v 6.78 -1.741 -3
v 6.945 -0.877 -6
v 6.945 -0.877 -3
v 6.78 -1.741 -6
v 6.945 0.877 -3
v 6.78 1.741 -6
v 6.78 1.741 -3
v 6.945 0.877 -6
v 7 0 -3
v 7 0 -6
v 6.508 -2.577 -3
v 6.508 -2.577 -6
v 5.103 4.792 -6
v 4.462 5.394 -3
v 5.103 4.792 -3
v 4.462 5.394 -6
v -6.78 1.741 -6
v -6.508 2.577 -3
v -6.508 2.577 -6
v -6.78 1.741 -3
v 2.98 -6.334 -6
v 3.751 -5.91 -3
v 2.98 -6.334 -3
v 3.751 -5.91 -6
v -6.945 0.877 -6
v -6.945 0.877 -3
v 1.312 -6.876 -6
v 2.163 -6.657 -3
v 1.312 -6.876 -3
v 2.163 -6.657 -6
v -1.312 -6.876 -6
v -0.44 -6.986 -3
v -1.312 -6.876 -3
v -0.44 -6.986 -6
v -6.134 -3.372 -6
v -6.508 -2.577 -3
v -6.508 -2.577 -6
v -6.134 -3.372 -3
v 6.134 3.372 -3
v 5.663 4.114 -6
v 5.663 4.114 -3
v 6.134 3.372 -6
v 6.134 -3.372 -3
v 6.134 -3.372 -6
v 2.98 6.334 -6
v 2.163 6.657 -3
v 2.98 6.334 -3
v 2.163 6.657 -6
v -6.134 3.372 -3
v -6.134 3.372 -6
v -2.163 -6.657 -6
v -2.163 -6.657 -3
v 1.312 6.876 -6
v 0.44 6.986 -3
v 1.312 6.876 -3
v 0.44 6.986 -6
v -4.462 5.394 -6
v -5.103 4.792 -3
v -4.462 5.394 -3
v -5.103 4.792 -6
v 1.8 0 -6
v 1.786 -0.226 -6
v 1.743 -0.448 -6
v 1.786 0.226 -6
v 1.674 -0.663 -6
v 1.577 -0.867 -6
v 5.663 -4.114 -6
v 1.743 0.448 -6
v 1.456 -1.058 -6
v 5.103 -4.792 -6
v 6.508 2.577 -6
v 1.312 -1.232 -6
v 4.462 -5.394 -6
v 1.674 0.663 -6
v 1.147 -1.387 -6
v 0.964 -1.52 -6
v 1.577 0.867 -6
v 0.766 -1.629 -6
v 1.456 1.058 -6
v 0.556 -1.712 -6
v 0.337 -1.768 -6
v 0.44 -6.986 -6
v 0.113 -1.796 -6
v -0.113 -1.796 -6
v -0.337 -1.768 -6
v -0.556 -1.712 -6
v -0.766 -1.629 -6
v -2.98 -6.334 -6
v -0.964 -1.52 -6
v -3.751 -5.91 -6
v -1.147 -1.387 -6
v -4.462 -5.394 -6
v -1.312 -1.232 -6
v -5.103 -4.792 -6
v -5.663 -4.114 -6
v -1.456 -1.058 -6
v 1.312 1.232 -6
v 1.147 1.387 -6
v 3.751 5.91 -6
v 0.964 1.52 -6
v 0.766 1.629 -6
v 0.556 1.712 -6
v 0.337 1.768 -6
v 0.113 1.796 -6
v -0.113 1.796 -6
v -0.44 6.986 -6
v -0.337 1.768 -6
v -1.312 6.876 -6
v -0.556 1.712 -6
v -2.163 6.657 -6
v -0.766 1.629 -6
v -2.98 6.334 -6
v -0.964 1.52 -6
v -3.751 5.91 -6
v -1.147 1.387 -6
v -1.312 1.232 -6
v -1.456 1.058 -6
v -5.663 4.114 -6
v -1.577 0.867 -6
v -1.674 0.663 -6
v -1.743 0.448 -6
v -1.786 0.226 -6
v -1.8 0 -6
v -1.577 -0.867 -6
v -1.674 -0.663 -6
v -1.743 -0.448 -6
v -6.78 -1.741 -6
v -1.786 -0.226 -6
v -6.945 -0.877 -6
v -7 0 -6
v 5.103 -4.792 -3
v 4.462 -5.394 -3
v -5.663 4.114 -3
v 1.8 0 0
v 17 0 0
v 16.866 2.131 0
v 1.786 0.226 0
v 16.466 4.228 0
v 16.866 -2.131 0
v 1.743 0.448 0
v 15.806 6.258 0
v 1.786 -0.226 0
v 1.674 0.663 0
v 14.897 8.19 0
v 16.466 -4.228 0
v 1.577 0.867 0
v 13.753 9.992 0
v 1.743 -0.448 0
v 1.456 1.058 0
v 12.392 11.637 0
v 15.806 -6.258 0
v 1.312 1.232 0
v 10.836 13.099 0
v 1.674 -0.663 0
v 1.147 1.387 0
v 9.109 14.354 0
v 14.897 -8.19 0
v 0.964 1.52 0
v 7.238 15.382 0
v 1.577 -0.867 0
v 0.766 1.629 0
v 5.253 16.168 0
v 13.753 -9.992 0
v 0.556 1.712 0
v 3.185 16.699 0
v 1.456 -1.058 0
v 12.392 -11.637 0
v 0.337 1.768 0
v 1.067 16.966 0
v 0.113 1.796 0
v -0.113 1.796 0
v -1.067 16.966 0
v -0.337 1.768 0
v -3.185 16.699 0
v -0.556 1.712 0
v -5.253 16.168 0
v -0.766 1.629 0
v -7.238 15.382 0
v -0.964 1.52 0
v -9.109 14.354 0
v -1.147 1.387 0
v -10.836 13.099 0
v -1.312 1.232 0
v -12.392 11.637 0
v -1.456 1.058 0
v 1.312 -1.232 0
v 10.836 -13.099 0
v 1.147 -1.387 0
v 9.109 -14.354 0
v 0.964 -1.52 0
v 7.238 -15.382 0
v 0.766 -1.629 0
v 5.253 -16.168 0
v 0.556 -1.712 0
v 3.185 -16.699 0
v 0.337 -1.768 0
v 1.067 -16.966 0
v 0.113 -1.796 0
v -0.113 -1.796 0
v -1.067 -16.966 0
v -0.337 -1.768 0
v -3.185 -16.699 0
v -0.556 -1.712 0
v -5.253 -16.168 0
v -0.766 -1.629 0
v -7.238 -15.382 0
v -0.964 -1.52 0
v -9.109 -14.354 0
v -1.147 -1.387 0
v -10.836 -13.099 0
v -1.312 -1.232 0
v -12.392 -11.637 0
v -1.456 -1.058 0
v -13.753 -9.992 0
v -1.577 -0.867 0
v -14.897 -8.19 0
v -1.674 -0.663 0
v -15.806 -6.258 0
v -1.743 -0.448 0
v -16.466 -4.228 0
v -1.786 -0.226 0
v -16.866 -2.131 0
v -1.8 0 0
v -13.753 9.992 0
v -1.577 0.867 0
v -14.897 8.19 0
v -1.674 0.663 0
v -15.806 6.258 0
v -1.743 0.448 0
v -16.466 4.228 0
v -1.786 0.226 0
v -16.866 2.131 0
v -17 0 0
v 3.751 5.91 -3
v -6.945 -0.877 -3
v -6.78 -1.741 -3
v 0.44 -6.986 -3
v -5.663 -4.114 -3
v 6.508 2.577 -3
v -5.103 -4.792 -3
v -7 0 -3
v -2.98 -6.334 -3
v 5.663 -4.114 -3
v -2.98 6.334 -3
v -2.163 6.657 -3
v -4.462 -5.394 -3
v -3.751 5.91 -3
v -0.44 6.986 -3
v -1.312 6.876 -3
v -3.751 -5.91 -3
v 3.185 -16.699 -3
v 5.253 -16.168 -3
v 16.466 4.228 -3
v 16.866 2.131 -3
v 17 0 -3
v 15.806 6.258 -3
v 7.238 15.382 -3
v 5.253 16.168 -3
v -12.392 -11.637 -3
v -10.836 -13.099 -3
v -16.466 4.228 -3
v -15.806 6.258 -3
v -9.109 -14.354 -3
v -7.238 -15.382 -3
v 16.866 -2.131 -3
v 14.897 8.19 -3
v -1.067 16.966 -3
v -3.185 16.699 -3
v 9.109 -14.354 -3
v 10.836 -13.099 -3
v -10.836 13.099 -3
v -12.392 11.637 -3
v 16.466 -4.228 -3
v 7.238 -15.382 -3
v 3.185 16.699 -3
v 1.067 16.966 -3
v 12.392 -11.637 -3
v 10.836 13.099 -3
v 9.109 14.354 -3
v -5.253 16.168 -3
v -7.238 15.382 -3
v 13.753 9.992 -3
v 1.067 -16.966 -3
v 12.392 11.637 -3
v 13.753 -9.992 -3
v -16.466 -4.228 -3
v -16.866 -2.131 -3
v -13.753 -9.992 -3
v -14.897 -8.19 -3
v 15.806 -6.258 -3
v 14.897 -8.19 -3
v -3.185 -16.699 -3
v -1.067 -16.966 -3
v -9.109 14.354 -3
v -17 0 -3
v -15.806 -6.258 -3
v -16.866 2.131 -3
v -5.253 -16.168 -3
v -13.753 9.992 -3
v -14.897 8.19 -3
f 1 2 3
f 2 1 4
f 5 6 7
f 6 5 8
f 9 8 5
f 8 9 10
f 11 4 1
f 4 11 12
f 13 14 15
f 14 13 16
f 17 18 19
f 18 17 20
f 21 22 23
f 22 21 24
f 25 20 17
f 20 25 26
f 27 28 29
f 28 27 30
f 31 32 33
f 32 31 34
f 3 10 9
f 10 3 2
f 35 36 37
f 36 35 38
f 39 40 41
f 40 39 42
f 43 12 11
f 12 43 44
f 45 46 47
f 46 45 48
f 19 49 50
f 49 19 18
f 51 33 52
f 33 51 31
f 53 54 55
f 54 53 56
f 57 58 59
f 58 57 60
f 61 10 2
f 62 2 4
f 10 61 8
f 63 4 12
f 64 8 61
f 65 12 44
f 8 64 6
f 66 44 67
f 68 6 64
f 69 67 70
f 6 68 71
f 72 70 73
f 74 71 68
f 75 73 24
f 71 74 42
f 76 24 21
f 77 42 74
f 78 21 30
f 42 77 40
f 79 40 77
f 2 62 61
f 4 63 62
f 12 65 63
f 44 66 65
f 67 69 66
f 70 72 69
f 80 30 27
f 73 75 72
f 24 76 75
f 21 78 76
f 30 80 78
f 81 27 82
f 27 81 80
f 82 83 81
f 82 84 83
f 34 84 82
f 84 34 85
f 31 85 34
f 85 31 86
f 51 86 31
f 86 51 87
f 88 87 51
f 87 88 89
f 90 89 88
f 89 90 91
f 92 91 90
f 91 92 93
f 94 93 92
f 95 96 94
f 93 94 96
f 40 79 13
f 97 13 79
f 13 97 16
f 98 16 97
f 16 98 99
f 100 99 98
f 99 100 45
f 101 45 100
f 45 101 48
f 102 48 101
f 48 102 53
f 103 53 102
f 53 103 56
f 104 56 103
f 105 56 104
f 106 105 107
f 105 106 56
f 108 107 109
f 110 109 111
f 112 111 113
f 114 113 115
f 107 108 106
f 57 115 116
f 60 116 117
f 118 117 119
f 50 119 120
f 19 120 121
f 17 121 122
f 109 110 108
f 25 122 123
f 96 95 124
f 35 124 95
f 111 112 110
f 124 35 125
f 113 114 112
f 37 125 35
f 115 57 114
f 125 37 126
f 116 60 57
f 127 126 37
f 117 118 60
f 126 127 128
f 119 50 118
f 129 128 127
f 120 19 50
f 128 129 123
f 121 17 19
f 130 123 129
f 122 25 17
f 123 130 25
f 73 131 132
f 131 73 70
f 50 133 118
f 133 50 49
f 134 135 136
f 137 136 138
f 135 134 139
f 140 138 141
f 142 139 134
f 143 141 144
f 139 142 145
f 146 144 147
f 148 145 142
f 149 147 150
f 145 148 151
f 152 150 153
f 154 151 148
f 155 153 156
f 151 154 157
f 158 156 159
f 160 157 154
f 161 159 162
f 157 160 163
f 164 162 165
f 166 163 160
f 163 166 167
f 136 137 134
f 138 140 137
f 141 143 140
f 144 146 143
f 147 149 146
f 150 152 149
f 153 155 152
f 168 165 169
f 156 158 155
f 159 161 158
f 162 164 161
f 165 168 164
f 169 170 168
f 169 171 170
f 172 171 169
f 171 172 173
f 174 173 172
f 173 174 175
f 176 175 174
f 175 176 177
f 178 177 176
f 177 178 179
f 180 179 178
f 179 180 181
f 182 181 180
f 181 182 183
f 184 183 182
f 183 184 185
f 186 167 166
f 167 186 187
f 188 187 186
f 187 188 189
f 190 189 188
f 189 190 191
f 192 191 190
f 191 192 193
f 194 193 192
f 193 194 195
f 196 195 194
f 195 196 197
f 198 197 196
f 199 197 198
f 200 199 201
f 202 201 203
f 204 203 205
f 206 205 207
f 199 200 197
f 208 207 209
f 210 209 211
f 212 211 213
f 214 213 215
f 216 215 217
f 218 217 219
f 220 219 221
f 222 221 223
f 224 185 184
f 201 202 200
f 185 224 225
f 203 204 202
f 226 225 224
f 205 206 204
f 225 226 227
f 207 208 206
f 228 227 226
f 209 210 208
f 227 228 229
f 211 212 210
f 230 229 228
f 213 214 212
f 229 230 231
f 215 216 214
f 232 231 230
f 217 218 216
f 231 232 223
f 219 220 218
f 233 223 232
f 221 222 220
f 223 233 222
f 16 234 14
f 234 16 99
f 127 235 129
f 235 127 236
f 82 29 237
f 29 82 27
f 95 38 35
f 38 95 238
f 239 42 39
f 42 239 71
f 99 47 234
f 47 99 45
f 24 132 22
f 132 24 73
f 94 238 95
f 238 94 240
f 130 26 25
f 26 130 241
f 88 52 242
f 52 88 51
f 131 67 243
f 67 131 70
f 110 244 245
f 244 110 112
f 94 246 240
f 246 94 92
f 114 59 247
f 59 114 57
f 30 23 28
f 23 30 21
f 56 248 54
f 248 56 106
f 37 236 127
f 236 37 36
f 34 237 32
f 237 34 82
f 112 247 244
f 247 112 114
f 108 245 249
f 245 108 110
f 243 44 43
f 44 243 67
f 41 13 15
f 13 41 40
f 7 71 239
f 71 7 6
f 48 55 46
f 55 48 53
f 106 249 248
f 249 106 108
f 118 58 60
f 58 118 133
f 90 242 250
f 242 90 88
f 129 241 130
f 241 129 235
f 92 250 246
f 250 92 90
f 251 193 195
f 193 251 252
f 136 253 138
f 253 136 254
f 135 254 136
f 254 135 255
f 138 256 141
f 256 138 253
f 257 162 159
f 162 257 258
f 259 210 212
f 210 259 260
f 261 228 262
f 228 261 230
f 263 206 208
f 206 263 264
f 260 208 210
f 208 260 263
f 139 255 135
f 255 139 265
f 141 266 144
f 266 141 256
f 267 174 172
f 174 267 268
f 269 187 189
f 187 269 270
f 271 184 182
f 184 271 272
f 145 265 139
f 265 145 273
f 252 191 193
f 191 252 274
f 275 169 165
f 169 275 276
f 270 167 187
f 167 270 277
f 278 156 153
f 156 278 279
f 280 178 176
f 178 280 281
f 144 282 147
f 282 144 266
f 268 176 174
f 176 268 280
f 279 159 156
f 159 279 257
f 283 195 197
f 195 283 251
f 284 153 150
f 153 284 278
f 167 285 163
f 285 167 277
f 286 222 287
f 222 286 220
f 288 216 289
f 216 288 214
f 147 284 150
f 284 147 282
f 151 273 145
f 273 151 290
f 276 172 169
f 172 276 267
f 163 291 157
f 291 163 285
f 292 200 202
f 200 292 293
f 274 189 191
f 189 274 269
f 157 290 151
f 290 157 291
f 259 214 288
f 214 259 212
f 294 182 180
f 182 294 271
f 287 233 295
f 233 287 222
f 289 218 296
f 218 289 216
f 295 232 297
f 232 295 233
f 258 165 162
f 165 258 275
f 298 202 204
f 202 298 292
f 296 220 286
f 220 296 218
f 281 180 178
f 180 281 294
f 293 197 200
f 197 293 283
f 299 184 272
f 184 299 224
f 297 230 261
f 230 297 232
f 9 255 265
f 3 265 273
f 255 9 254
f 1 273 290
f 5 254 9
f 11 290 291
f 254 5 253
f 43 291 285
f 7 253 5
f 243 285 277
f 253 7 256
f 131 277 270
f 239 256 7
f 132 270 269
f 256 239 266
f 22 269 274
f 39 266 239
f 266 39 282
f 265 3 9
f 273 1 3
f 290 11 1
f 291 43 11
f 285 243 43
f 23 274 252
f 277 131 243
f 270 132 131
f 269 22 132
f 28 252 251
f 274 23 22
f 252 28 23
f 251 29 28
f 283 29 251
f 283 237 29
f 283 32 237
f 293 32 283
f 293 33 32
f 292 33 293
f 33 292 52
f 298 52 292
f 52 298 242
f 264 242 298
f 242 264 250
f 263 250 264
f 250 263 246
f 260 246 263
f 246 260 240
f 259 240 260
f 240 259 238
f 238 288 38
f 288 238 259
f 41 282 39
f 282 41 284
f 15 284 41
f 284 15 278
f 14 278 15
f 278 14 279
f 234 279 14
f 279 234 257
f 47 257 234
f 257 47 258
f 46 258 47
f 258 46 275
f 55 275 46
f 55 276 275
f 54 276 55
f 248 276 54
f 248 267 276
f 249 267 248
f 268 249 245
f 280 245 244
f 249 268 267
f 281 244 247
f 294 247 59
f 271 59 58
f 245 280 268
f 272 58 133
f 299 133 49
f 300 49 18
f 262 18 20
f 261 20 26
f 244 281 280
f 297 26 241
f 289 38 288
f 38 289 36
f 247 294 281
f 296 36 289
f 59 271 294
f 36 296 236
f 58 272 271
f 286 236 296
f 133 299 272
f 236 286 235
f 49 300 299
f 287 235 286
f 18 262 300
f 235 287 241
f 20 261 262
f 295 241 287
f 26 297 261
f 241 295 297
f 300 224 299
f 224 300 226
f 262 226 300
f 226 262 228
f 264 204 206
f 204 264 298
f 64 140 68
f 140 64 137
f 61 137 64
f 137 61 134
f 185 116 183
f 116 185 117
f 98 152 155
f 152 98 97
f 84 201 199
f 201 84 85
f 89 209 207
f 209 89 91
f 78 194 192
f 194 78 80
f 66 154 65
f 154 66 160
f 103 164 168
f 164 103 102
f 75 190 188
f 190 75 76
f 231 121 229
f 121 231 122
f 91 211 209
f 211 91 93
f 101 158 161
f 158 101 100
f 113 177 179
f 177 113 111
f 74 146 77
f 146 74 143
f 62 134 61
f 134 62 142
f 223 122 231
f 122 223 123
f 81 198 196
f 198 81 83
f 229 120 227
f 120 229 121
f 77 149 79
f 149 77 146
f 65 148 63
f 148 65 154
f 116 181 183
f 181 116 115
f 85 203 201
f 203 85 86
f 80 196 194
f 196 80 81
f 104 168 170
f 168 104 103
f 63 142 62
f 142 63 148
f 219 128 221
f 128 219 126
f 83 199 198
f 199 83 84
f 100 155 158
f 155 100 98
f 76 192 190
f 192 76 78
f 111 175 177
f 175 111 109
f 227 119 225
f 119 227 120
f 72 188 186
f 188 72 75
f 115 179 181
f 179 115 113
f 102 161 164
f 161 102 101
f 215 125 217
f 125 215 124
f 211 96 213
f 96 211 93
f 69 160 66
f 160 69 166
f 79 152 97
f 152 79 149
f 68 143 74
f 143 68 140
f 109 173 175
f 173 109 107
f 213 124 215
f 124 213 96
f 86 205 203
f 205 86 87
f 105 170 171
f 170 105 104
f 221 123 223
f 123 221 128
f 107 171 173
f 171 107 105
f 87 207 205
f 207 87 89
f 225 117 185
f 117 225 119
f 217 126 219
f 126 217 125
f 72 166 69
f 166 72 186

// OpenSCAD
$fn = 50;


difference() {
	union() {
		translate(v = [0, 0, -6.0000000000]) {
			cylinder(h = 6, r = 7.0000000000);
		}
		translate(v = [0, 0, -3.0000000000]) {
			cylinder(h = 3, r = 17.0000000000);
		}
	}
	union() {
		#translate(v = [0, 0, -6]) {
			cylinder(h = 6, r = 1.8000000000);
		}
	}
}
